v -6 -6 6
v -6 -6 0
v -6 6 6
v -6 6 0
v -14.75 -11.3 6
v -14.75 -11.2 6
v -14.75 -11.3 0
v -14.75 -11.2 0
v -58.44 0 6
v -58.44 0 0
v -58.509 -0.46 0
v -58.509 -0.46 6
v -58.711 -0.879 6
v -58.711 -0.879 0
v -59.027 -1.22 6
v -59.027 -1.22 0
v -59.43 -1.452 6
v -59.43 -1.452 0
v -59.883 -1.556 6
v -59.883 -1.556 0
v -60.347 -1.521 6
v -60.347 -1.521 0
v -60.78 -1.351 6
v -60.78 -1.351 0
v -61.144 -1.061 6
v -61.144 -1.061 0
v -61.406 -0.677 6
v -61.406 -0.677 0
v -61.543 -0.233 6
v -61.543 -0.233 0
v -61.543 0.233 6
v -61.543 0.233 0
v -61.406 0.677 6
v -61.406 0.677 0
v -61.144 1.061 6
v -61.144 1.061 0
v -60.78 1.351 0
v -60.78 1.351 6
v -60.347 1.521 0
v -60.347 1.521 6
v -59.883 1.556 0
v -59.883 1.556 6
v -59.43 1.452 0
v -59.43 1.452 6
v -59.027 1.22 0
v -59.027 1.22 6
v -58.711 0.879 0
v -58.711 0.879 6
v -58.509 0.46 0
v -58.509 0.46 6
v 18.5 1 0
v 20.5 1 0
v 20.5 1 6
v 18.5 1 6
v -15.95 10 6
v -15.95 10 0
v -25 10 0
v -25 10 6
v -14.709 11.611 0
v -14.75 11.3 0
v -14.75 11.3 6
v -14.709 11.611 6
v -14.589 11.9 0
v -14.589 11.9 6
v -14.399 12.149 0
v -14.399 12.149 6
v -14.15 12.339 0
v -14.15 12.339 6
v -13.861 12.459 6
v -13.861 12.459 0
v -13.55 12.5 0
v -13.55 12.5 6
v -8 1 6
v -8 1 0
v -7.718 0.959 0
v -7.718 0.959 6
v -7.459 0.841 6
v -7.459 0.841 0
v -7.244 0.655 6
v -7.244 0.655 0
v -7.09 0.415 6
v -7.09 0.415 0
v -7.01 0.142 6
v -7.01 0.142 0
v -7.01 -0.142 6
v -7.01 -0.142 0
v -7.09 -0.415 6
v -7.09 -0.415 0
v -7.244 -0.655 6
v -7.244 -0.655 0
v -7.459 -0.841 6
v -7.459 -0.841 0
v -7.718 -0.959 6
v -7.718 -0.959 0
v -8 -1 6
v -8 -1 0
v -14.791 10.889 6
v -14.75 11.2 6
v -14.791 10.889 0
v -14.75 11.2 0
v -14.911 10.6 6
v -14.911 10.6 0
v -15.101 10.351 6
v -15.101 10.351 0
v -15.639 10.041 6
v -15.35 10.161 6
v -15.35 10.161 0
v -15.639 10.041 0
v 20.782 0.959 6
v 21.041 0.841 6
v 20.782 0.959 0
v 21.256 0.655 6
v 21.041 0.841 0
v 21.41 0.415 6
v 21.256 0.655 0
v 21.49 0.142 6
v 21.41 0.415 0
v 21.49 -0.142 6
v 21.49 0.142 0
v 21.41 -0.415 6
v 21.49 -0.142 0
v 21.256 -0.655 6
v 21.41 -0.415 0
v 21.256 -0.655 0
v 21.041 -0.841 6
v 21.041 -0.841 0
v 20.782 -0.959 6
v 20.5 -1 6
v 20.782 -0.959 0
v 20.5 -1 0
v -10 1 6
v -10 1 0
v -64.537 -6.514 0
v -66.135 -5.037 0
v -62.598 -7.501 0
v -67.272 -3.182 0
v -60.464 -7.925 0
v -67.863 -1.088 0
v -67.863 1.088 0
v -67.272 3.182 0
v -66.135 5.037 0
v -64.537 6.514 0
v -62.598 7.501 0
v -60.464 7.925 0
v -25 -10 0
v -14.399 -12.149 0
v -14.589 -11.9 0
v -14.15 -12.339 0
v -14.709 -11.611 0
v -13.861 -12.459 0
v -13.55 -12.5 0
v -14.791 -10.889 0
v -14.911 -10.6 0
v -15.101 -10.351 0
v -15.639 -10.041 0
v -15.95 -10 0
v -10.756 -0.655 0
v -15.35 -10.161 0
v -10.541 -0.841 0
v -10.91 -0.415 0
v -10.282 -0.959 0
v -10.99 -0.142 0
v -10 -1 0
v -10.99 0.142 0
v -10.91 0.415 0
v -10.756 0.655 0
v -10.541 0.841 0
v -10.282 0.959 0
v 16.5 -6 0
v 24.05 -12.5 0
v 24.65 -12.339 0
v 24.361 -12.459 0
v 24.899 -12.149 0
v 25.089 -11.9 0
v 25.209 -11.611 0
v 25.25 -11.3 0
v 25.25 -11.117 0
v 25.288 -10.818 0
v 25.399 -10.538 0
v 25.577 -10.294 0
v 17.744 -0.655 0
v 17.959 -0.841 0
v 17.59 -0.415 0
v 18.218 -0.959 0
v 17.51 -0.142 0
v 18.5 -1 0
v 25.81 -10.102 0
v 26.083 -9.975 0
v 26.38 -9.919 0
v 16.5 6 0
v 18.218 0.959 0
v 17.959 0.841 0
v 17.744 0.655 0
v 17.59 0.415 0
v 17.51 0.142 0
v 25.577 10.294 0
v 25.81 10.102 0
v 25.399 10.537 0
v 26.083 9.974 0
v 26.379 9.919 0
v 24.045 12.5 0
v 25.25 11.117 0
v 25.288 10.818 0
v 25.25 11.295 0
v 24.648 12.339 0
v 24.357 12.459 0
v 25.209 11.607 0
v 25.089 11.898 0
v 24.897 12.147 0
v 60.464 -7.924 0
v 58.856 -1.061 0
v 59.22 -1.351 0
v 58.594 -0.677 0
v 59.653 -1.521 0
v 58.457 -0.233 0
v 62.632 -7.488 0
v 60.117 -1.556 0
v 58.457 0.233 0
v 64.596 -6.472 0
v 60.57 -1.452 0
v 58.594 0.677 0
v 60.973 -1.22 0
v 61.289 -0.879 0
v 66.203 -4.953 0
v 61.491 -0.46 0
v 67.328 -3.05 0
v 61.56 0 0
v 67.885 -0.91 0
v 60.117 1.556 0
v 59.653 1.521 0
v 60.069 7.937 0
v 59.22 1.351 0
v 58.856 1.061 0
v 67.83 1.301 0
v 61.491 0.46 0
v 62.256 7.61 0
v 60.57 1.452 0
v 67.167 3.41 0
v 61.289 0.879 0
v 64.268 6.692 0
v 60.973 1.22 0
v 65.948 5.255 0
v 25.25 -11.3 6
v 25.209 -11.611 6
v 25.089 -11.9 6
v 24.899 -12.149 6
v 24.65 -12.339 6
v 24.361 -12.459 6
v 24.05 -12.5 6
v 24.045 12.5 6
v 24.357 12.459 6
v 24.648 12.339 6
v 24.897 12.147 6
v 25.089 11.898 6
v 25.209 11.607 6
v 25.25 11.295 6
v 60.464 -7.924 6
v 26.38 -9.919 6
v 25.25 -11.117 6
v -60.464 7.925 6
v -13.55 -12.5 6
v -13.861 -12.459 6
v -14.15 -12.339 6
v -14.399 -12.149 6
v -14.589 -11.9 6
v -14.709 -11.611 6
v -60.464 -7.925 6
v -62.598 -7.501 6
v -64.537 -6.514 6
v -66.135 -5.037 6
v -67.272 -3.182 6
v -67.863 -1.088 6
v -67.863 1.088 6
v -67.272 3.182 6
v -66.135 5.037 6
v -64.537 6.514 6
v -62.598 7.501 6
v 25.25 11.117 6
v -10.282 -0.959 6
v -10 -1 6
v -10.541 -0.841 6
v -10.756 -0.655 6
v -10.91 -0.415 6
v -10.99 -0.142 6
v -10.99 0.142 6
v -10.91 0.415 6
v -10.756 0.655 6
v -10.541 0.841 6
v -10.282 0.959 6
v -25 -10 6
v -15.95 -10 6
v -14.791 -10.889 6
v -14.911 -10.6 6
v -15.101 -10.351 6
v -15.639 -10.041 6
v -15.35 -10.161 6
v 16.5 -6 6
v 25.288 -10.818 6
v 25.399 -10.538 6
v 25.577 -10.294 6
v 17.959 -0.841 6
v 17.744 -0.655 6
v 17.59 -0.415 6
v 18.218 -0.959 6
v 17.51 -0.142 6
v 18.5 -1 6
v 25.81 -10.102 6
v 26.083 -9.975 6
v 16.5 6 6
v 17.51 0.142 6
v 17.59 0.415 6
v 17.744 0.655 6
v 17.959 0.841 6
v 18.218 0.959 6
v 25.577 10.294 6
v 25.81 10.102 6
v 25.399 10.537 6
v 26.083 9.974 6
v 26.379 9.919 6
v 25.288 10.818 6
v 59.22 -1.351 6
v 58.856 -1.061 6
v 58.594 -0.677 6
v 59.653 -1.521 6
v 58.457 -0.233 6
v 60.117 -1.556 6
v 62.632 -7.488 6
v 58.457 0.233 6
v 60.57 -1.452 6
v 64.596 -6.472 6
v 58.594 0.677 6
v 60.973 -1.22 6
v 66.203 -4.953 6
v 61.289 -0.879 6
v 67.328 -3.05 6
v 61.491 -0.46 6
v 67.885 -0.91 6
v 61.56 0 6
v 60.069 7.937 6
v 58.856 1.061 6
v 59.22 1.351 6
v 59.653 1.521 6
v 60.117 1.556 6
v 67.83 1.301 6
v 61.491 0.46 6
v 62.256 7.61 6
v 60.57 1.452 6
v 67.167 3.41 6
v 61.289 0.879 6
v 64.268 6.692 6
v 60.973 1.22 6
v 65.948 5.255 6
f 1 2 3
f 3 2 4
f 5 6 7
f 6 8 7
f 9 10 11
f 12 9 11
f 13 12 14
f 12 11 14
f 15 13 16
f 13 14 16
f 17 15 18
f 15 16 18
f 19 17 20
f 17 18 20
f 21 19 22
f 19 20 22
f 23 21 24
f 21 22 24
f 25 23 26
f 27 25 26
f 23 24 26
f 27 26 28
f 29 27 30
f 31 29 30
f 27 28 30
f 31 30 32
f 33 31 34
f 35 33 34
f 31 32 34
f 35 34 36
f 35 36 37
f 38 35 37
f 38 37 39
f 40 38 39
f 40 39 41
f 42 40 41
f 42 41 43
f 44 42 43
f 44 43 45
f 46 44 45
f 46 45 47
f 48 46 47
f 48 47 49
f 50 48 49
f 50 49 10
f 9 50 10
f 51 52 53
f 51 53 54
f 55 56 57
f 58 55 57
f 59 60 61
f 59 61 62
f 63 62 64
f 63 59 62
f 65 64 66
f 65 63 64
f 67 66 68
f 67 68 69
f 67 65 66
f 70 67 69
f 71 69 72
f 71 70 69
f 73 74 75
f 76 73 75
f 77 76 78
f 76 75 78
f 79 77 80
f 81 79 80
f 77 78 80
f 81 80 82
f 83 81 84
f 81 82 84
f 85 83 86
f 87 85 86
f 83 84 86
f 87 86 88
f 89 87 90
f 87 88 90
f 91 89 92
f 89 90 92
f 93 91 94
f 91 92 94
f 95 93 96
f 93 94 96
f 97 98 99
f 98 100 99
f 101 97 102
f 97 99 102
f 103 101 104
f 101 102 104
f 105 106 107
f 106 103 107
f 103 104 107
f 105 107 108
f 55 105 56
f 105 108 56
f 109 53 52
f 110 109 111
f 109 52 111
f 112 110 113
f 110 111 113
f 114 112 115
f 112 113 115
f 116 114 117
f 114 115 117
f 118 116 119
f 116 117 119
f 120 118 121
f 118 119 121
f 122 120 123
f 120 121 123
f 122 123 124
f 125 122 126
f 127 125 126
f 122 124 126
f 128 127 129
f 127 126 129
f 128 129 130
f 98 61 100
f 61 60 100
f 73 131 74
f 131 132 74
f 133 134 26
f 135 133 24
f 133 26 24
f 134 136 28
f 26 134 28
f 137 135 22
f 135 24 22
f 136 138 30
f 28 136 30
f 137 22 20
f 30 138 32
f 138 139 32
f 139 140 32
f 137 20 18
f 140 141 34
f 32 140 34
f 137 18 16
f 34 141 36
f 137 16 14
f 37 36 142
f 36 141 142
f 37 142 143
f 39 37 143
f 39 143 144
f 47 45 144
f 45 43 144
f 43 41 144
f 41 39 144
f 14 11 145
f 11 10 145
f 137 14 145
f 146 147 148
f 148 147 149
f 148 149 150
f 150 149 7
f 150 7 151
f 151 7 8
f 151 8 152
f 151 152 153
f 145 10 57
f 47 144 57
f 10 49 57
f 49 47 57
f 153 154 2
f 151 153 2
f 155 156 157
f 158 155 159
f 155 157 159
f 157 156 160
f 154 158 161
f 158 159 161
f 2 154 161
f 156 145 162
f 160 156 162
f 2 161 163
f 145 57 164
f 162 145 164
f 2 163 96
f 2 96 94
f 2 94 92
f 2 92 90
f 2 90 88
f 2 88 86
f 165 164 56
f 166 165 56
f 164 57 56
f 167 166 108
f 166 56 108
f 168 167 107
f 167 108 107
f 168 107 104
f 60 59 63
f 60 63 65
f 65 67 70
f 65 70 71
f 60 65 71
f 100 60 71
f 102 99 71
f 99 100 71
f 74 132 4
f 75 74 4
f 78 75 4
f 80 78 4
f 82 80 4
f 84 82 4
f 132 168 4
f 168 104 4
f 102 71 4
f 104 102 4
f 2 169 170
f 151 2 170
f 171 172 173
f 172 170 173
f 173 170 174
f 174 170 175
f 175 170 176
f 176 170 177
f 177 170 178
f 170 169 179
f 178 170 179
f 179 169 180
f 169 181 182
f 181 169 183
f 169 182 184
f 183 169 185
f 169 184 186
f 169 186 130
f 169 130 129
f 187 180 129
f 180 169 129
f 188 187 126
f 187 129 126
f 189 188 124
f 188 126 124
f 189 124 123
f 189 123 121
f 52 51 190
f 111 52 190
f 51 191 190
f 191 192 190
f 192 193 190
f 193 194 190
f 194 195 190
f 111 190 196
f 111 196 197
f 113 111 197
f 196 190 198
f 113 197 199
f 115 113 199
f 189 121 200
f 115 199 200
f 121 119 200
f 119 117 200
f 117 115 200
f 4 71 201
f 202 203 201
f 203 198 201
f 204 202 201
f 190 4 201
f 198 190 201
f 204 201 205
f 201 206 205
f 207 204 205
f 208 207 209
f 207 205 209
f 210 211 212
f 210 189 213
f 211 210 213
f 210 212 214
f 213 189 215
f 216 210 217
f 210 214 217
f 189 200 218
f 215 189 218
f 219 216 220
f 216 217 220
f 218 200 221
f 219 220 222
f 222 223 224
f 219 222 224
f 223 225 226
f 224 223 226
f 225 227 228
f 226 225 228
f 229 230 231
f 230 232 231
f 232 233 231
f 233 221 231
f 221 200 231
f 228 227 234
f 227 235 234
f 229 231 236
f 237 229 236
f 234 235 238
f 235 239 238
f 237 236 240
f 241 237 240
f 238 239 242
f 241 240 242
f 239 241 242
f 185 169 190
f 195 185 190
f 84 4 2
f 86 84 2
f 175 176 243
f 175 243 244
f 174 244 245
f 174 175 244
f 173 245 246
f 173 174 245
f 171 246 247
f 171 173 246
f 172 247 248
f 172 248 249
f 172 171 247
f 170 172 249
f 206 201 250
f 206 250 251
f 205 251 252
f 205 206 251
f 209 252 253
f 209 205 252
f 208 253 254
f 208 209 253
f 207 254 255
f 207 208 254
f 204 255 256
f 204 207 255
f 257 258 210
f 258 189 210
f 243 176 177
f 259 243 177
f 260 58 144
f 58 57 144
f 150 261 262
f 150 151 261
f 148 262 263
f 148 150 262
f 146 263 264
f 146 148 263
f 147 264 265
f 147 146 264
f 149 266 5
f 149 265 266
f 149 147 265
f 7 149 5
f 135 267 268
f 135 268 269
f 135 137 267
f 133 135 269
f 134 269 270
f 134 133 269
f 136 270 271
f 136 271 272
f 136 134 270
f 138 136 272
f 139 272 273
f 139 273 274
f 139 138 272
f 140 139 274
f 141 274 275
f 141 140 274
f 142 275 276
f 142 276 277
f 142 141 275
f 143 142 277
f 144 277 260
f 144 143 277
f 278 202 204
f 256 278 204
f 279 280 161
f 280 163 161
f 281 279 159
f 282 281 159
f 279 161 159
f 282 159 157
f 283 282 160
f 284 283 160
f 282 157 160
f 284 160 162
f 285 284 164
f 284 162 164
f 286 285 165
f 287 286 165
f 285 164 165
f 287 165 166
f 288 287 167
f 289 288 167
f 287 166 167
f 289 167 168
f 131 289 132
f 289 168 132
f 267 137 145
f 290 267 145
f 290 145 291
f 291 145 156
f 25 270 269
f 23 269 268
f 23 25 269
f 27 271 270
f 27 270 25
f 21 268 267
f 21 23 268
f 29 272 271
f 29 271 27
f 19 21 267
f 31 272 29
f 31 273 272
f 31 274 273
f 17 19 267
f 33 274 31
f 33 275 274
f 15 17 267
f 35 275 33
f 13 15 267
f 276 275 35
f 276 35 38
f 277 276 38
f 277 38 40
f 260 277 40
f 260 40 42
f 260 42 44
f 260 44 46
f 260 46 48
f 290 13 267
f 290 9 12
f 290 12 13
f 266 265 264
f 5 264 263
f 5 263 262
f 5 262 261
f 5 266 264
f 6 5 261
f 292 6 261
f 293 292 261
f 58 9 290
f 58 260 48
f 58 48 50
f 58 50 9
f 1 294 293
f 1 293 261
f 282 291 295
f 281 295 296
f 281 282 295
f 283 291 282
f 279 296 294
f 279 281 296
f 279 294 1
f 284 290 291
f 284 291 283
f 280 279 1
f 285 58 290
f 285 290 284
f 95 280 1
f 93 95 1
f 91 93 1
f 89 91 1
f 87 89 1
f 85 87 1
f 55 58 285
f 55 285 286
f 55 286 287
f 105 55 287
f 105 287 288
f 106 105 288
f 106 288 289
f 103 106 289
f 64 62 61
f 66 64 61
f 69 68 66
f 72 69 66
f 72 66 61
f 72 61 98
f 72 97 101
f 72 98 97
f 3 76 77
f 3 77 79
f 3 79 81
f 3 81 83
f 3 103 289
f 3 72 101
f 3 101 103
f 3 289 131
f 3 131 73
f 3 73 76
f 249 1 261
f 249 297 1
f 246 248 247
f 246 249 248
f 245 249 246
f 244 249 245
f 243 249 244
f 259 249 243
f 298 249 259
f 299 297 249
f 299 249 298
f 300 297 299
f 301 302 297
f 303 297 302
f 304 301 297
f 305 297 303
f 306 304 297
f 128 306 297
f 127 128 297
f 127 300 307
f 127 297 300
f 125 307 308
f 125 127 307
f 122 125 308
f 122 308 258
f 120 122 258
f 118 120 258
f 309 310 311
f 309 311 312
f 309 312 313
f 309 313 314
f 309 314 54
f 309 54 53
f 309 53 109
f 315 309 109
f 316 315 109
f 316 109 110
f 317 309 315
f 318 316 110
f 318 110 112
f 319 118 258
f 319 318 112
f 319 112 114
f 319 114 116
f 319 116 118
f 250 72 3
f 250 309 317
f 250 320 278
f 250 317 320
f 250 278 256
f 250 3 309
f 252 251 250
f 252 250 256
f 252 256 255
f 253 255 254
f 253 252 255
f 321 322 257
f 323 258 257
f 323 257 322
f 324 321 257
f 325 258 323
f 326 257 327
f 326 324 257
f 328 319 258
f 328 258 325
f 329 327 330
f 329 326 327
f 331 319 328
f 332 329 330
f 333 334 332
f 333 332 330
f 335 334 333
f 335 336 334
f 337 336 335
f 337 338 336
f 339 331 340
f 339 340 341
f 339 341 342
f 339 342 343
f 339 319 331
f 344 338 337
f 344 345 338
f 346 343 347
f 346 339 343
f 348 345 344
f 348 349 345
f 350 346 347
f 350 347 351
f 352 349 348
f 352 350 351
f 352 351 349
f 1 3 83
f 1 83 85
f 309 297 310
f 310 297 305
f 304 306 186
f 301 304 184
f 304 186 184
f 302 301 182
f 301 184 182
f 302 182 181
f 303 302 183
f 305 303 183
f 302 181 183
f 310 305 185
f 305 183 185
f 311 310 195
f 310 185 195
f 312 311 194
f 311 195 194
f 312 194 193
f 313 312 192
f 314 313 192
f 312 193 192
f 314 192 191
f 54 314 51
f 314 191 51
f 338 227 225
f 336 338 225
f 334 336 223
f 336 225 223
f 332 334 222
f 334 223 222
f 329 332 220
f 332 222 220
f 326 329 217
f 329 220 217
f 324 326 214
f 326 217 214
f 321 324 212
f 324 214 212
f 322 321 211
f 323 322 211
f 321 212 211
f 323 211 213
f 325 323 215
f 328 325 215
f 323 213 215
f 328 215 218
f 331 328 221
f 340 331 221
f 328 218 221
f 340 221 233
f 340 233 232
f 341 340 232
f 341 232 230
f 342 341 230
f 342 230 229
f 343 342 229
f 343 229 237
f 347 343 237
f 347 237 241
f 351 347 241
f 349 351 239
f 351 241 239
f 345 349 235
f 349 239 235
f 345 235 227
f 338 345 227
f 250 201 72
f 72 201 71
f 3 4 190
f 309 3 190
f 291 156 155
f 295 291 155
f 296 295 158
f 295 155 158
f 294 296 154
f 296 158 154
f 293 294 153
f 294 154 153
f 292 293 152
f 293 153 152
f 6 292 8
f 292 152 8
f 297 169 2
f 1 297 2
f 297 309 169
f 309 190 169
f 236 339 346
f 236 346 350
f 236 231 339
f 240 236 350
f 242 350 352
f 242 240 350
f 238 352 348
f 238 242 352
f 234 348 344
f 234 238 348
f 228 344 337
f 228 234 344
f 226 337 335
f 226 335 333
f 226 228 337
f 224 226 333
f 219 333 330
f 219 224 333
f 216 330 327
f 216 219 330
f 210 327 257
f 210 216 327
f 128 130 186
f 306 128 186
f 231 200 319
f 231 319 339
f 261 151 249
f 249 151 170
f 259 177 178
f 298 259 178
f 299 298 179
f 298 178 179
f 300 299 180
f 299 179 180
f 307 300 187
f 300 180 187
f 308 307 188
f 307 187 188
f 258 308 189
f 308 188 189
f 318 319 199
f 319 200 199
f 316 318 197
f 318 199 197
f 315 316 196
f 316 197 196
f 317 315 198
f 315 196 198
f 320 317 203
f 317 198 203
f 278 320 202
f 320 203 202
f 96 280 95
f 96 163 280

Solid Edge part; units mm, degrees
sketch "Sketch1" plane through (0, 0, 0) normal (0, 0, 1) x (1, 0, 0)
  line L0 (-15.95, 10) -> (-25, 10)
  line L1 (-25, 10) -> (-60.4638, 7.9246)
  line L2 (-60.4638, -7.9246) -> (-25, -10)
  line L3 (-25, -10) -> (-15.95, -10)
  arc A0 (-15.95, -10) -> (-14.75, -11.2) centre (-15.95, -11.2) cw
  line L4 (-14.75, -11.2) -> (-14.75, -11.3)
  arc A1 (-14.75, -11.3) -> (-13.55, -12.5) centre (-13.55, -11.3) ccw
  line L5 (-13.55, -12.5) -> (24.05, -12.5)
  arc A2 (25.25, -11.3) -> (24.05, -12.5) centre (24.05, -11.3) cw
  line L6 (25.25, -11.3) -> (25.25, -11.1172)
  arc A3 (25.25, -11.1172) -> (26.3799, -9.9192) centre (26.45, -11.1172) cw
  line L7 (26.3799, -9.9192) -> (60.4639, -7.9238)
  line L8 (26.3795, 9.9189) -> (60.069, 7.9371)
  arc A4 (25.25, 11.1168) -> (26.3795, 9.9189) centre (26.45, 11.1168) ccw
  line L9 (25.25, 11.1168) -> (25.25, 11.295)
  arc A5 (24.045, 12.5) -> (25.25, 11.295) centre (24.045, 11.295) cw
  line L10 (24.045, 12.5) -> (-13.55, 12.5)
  arc A6 (-14.75, 11.3) -> (-13.55, 12.5) centre (-13.55, 11.3) cw
  line L11 (-14.75, 11.3) -> (-14.75, 11.2)
  arc A7 (-15.95, 10) -> (-14.75, 11.2) centre (-15.95, 11.2) ccw
  arc A8 (-60.4638, -7.9246) -> (-60.4638, 7.9246) centre (-60, 0) cw
  arc A9 (60.069, 7.9371) -> (60.4639, -7.9238) centre (60, 0) cw
extrude "Protrusion1" add sketch "Sketch1" along normal blind 6
sketch "Sketch2" plane through (0, 0, 0) normal (0, 0, 1) x (1, 0, 0)
  circle A0 centre (-60, 0) radius 1.56
  circle A1 centre (60, 0) radius 1.56
extrude "ExtrudedCutout_1" cut sketch "Sketch2" along normal blind 17.9181
sketch "Sketch3" plane through (0, 0, 0) normal (0, 0, 1) x (1, 0, 0)
  line L0 (-6, 6) -> (16.5, 6)
  line L1 (16.5, 6) -> (16.5, -6)
  line L2 (16.5, -6) -> (-6, -6)
  line L3 (-6, -6) -> (-6, 0)
  line L4 (-6, 0) -> (-6, 6)
  arc A0 (-8, 1) -> (-8, -1) centre (-8, 0) cw
  line L5 (-10, -1) -> (-8, -1)
  arc A1 (-10, -1) -> (-10, 1) centre (-10, 0) cw
  line L6 (-10, 1) -> (-8, 1)
  arc A2 (20.5, -1) -> (20.5, 1) centre (20.5, 0) ccw
  line L7 (20.5, 1) -> (18.5, 1)
  arc A3 (18.5, 1) -> (18.5, -1) centre (18.5, 0) ccw
  line L8 (20.5, -1) -> (18.5, -1)
extrude "ExtrudedCutout_2" cut sketch "Sketch3" along normal blind 36.5435
